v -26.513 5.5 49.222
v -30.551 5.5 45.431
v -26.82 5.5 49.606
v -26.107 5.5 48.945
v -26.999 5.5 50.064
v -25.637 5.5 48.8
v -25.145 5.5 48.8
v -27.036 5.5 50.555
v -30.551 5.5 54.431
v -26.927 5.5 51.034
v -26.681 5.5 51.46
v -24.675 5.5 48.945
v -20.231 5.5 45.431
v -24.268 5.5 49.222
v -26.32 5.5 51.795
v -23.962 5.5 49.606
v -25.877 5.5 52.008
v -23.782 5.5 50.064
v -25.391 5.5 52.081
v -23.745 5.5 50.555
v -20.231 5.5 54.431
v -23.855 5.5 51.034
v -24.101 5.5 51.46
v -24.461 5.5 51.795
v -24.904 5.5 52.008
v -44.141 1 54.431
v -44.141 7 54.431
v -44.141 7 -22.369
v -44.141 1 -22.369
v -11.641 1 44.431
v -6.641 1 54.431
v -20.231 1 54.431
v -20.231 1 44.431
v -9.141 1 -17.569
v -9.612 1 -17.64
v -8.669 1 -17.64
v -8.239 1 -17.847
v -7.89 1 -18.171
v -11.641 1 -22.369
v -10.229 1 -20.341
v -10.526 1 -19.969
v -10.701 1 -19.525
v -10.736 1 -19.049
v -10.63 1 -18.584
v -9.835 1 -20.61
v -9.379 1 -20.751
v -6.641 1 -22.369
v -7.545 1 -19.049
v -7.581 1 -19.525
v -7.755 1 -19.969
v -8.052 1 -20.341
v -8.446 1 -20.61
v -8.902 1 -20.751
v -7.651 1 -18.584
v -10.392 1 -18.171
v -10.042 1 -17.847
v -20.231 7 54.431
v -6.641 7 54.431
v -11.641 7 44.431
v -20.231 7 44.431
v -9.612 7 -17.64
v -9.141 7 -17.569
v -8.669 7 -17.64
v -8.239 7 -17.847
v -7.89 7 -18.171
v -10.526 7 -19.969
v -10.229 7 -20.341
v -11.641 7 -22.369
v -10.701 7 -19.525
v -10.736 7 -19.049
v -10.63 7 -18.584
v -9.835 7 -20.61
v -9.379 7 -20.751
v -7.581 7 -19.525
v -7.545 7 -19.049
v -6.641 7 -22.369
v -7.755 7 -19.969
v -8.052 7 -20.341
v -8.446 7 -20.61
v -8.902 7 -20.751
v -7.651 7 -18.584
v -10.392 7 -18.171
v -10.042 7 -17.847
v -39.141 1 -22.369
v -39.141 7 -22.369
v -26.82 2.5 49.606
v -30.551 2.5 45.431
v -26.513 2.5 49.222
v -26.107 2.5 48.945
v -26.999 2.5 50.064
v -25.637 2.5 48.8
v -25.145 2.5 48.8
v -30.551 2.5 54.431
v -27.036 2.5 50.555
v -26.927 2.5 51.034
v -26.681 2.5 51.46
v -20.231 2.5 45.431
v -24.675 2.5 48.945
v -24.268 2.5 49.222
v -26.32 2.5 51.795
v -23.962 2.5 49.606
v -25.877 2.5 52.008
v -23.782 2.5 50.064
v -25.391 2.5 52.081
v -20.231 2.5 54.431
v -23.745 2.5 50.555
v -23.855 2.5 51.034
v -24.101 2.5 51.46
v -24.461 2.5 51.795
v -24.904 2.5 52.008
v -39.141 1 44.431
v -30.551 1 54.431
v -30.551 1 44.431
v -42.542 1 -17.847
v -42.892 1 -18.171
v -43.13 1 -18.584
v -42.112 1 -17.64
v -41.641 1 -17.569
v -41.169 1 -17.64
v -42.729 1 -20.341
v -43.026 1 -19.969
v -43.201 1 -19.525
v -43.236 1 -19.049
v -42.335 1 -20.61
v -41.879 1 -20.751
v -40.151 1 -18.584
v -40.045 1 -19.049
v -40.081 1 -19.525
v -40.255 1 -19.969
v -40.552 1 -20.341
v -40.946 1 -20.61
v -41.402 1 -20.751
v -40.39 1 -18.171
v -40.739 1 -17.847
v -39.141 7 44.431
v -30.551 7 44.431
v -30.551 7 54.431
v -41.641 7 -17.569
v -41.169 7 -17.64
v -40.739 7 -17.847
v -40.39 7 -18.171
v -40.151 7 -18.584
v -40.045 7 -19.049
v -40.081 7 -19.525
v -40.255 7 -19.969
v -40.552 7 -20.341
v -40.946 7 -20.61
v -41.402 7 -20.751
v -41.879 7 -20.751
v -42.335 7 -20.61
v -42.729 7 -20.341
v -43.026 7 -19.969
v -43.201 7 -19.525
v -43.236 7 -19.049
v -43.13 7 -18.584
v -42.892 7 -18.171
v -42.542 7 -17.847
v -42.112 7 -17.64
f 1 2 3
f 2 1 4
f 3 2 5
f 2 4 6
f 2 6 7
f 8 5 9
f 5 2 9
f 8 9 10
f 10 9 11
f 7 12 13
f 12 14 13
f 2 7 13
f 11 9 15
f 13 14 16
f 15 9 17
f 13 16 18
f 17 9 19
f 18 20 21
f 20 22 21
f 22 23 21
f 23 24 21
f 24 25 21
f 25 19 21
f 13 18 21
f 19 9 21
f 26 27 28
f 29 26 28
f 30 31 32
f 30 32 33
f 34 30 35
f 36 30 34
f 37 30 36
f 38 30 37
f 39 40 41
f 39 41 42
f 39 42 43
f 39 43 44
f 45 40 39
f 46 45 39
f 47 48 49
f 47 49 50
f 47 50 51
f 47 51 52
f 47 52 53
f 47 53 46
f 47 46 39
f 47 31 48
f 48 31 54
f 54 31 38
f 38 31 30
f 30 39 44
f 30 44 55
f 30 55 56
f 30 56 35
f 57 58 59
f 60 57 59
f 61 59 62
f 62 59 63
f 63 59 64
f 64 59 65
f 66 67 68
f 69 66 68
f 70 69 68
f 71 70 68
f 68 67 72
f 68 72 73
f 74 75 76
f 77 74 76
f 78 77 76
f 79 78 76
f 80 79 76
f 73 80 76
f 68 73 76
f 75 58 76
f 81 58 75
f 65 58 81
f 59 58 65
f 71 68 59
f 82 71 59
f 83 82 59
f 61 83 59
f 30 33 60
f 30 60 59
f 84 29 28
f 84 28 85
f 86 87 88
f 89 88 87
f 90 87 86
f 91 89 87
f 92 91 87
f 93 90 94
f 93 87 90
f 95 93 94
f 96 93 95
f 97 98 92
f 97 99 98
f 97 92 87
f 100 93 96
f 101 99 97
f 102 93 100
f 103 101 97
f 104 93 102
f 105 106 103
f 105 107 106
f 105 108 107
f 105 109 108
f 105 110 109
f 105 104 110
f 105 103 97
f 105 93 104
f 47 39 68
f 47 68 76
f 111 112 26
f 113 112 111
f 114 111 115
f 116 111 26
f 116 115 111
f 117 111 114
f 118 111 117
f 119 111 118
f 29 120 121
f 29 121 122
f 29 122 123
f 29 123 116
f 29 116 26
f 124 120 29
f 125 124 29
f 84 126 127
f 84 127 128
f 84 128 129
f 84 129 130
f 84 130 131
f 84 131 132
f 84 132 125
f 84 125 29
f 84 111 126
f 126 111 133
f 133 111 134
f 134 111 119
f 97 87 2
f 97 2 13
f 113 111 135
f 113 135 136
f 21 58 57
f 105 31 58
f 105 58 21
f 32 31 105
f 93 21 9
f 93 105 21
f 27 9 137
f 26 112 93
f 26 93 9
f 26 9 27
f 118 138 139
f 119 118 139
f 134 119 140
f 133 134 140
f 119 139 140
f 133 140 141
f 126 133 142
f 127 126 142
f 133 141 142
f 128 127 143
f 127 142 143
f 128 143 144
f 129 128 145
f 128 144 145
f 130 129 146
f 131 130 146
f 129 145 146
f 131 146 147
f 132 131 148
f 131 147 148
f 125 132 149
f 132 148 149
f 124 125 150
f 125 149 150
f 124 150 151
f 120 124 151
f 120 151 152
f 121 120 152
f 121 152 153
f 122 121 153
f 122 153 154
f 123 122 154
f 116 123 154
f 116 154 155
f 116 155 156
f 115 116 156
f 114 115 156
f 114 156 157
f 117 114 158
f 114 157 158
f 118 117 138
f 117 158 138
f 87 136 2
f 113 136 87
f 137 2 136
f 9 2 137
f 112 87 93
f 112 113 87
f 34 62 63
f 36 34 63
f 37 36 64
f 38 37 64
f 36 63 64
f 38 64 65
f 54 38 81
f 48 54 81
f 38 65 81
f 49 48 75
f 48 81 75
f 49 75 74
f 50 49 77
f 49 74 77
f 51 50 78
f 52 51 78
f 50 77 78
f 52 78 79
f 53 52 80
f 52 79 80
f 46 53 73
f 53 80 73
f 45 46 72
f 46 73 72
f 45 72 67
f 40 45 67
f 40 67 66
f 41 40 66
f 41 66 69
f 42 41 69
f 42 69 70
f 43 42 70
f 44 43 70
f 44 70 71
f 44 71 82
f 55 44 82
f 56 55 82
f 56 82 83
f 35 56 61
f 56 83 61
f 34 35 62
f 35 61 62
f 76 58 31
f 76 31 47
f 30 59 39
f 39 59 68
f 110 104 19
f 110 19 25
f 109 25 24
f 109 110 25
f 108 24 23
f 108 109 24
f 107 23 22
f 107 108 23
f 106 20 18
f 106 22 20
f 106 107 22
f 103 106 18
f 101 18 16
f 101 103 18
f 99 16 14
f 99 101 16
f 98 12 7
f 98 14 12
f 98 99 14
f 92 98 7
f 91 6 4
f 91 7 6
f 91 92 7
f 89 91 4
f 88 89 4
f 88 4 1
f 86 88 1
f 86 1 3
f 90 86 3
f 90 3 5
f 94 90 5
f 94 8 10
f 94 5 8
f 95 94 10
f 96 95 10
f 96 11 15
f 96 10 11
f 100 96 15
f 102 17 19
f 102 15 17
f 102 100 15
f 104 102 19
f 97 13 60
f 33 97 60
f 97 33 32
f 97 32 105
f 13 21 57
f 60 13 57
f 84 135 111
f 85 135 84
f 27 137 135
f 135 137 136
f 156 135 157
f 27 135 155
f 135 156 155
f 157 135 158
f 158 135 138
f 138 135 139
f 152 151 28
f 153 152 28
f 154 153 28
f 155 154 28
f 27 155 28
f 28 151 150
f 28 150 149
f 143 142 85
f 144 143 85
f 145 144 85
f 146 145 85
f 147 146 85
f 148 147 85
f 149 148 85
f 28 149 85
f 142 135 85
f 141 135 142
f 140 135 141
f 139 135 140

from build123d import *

# Parameters (mm, degrees)
SKETCH1_R           = 1.65
BOSS_EXTRUDE1_DEPTH = 8
SKETCH2_W           = 10.32
SKETCH2_H           = 9
CUT_EXTRUDE1_DEPTH  = 2.4
SKETCH3_W           = 10.32
SKETCH3_H           = 9
CUT_EXTRUDE2_DEPTH  = 2.4
BOSS_EXTRUDE2_DEPTH = 8
SKETCH7_W           = 76.8
SKETCH7_H           = 1
CUT_EXTRUDE3_DEPTH  = 68.43727806
SKETCH9_W           = 10.32
SKETCH9_H           = 0.1
CUT_EXTRUDE4_DEPTH  = 10
SKETCH10_R          = 1.6
SKETCH10_W          = 1.25
SKETCH10_H          = 66.8
SKETCH10_W_2        = 0.75
SKETCH10_H_2        = 76.8
CUT_EXTRUDE5_DEPTH  = 6


with BuildPart() as part:
    # Sketch1 → Boss-Extrude1 (new body)
    with BuildSketch(Plane(origin=(0, 0, 0), x_dir=(1, 0, 0), z_dir=(0, 1, 0))):
        Polygon((-37.890672074, -44.431484199), (-30.550672074, -44.431484199), (-30.550672074, -45.431484199), (-20.230672074, -45.431484199), (-20.230672074, -44.431484199), (-12.890672074, -44.431484199), (-12.890672074, 4.468515801), (-7.890672074, 4.468515801), (-7.890672074, -54.431484199), (-42.890672074, -54.431484199), (-42.890672074, 4.468515801), (-37.890672074, 4.468515801), align=None)
        with Locations(Location((-25.390672074, -50.431484199, 0), (0, 0, 270))):
            Circle(SKETCH1_R, mode=Mode.SUBTRACT)
    extrude(amount=BOSS_EXTRUDE1_DEPTH)

    # Sketch2 → Cut-Extrude1 (cut)
    with BuildSketch(Plane(origin=(0, 8, 0), x_dir=(1, 0, 0), z_dir=(0, 1, 0))):
        with Locations((-25.390672074, -49.931484199)):
            Rectangle(SKETCH2_W, SKETCH2_H)
    extrude(amount=-CUT_EXTRUDE1_DEPTH, mode=Mode.SUBTRACT)

    # Sketch3 → Cut-Extrude2 (cut)
    with BuildSketch(Plane.XZ):
        with Locations((-25.390672074, 49.931484199)):
            Rectangle(SKETCH3_W, SKETCH3_H)
    extrude(amount=-CUT_EXTRUDE2_DEPTH, mode=Mode.SUBTRACT)

    # Sketch6 → Boss-Extrude2 (add)
    with BuildSketch(Plane.XZ):
        Polygon((-37.890672074, -22.368515801), (-37.890672074, -4.468515801), (-42.890672074, -4.468515801), (-42.890672074, 54.431484199), (-44.890672074, 54.431484199), (-44.890672074, -10.768515801), (-44.890672074, -22.368515801), align=None)
        Polygon((-7.890672074, -4.468515801), (-12.890672074, -4.468515801), (-12.890672074, -22.368515801), (-5.890672074, -22.368515801), (-5.890672074, -10.768515801), (-5.890672074, 54.431484199), (-7.890672074, 54.431484199), align=None)
    extrude(amount=-BOSS_EXTRUDE2_DEPTH)

    # Sketch7 → Cut-Extrude3 (cut, through all)
    with BuildSketch(Plane(origin=(-5.890672074, 0, 0), x_dir=(0, 0, -1), z_dir=(1, 0, 0))):
        with Locations((-16.031484199, 7.5)):
            Rectangle(SKETCH7_W, SKETCH7_H)
        with Locations((-16.031484199, 0.5)):
            Rectangle(SKETCH7_W, SKETCH7_H)
    extrude(amount=-CUT_EXTRUDE3_DEPTH, mode=Mode.SUBTRACT)

    # Sketch9 → Cut-Extrude4 (cut)
    with BuildSketch(Plane.XY.offset(54.431484199)):
        with Locations((-25.390672074, 5.55)):
            Rectangle(SKETCH9_W, SKETCH9_H)
        with Locations((-25.390672074, 2.45)):
            Rectangle(SKETCH9_W, SKETCH9_H)
    extrude(amount=-CUT_EXTRUDE4_DEPTH, mode=Mode.SUBTRACT)

    # Sketch10 → Cut-Extrude5 (cut)
    with BuildSketch(Plane(origin=(0, 7, 0), x_dir=(1, 0, 0), z_dir=(0, 1, 0))):
        with Locations(Location((-41.640672074, 19.168515801, 0), (0, 0, 270))):
            Circle(SKETCH10_R)
        with Locations(Location((-9.140672074, 19.168515801, 0), (0, 0, 270))):
            Circle(SKETCH10_R)
        with Locations((-38.515672074, -11.031484199)):
            Rectangle(SKETCH10_W, SKETCH10_H)
        with Locations((-12.265672074, -11.031484199)):
            Rectangle(SKETCH10_W, SKETCH10_H)
        with Locations((-6.265672074, -16.031484199)):
            Rectangle(SKETCH10_W_2, SKETCH10_H_2)
        with Locations((-44.515672074, -16.031484199)):
            Rectangle(SKETCH10_W_2, SKETCH10_H_2)
    extrude(amount=-CUT_EXTRUDE5_DEPTH, mode=Mode.SUBTRACT)


solid = part.part
